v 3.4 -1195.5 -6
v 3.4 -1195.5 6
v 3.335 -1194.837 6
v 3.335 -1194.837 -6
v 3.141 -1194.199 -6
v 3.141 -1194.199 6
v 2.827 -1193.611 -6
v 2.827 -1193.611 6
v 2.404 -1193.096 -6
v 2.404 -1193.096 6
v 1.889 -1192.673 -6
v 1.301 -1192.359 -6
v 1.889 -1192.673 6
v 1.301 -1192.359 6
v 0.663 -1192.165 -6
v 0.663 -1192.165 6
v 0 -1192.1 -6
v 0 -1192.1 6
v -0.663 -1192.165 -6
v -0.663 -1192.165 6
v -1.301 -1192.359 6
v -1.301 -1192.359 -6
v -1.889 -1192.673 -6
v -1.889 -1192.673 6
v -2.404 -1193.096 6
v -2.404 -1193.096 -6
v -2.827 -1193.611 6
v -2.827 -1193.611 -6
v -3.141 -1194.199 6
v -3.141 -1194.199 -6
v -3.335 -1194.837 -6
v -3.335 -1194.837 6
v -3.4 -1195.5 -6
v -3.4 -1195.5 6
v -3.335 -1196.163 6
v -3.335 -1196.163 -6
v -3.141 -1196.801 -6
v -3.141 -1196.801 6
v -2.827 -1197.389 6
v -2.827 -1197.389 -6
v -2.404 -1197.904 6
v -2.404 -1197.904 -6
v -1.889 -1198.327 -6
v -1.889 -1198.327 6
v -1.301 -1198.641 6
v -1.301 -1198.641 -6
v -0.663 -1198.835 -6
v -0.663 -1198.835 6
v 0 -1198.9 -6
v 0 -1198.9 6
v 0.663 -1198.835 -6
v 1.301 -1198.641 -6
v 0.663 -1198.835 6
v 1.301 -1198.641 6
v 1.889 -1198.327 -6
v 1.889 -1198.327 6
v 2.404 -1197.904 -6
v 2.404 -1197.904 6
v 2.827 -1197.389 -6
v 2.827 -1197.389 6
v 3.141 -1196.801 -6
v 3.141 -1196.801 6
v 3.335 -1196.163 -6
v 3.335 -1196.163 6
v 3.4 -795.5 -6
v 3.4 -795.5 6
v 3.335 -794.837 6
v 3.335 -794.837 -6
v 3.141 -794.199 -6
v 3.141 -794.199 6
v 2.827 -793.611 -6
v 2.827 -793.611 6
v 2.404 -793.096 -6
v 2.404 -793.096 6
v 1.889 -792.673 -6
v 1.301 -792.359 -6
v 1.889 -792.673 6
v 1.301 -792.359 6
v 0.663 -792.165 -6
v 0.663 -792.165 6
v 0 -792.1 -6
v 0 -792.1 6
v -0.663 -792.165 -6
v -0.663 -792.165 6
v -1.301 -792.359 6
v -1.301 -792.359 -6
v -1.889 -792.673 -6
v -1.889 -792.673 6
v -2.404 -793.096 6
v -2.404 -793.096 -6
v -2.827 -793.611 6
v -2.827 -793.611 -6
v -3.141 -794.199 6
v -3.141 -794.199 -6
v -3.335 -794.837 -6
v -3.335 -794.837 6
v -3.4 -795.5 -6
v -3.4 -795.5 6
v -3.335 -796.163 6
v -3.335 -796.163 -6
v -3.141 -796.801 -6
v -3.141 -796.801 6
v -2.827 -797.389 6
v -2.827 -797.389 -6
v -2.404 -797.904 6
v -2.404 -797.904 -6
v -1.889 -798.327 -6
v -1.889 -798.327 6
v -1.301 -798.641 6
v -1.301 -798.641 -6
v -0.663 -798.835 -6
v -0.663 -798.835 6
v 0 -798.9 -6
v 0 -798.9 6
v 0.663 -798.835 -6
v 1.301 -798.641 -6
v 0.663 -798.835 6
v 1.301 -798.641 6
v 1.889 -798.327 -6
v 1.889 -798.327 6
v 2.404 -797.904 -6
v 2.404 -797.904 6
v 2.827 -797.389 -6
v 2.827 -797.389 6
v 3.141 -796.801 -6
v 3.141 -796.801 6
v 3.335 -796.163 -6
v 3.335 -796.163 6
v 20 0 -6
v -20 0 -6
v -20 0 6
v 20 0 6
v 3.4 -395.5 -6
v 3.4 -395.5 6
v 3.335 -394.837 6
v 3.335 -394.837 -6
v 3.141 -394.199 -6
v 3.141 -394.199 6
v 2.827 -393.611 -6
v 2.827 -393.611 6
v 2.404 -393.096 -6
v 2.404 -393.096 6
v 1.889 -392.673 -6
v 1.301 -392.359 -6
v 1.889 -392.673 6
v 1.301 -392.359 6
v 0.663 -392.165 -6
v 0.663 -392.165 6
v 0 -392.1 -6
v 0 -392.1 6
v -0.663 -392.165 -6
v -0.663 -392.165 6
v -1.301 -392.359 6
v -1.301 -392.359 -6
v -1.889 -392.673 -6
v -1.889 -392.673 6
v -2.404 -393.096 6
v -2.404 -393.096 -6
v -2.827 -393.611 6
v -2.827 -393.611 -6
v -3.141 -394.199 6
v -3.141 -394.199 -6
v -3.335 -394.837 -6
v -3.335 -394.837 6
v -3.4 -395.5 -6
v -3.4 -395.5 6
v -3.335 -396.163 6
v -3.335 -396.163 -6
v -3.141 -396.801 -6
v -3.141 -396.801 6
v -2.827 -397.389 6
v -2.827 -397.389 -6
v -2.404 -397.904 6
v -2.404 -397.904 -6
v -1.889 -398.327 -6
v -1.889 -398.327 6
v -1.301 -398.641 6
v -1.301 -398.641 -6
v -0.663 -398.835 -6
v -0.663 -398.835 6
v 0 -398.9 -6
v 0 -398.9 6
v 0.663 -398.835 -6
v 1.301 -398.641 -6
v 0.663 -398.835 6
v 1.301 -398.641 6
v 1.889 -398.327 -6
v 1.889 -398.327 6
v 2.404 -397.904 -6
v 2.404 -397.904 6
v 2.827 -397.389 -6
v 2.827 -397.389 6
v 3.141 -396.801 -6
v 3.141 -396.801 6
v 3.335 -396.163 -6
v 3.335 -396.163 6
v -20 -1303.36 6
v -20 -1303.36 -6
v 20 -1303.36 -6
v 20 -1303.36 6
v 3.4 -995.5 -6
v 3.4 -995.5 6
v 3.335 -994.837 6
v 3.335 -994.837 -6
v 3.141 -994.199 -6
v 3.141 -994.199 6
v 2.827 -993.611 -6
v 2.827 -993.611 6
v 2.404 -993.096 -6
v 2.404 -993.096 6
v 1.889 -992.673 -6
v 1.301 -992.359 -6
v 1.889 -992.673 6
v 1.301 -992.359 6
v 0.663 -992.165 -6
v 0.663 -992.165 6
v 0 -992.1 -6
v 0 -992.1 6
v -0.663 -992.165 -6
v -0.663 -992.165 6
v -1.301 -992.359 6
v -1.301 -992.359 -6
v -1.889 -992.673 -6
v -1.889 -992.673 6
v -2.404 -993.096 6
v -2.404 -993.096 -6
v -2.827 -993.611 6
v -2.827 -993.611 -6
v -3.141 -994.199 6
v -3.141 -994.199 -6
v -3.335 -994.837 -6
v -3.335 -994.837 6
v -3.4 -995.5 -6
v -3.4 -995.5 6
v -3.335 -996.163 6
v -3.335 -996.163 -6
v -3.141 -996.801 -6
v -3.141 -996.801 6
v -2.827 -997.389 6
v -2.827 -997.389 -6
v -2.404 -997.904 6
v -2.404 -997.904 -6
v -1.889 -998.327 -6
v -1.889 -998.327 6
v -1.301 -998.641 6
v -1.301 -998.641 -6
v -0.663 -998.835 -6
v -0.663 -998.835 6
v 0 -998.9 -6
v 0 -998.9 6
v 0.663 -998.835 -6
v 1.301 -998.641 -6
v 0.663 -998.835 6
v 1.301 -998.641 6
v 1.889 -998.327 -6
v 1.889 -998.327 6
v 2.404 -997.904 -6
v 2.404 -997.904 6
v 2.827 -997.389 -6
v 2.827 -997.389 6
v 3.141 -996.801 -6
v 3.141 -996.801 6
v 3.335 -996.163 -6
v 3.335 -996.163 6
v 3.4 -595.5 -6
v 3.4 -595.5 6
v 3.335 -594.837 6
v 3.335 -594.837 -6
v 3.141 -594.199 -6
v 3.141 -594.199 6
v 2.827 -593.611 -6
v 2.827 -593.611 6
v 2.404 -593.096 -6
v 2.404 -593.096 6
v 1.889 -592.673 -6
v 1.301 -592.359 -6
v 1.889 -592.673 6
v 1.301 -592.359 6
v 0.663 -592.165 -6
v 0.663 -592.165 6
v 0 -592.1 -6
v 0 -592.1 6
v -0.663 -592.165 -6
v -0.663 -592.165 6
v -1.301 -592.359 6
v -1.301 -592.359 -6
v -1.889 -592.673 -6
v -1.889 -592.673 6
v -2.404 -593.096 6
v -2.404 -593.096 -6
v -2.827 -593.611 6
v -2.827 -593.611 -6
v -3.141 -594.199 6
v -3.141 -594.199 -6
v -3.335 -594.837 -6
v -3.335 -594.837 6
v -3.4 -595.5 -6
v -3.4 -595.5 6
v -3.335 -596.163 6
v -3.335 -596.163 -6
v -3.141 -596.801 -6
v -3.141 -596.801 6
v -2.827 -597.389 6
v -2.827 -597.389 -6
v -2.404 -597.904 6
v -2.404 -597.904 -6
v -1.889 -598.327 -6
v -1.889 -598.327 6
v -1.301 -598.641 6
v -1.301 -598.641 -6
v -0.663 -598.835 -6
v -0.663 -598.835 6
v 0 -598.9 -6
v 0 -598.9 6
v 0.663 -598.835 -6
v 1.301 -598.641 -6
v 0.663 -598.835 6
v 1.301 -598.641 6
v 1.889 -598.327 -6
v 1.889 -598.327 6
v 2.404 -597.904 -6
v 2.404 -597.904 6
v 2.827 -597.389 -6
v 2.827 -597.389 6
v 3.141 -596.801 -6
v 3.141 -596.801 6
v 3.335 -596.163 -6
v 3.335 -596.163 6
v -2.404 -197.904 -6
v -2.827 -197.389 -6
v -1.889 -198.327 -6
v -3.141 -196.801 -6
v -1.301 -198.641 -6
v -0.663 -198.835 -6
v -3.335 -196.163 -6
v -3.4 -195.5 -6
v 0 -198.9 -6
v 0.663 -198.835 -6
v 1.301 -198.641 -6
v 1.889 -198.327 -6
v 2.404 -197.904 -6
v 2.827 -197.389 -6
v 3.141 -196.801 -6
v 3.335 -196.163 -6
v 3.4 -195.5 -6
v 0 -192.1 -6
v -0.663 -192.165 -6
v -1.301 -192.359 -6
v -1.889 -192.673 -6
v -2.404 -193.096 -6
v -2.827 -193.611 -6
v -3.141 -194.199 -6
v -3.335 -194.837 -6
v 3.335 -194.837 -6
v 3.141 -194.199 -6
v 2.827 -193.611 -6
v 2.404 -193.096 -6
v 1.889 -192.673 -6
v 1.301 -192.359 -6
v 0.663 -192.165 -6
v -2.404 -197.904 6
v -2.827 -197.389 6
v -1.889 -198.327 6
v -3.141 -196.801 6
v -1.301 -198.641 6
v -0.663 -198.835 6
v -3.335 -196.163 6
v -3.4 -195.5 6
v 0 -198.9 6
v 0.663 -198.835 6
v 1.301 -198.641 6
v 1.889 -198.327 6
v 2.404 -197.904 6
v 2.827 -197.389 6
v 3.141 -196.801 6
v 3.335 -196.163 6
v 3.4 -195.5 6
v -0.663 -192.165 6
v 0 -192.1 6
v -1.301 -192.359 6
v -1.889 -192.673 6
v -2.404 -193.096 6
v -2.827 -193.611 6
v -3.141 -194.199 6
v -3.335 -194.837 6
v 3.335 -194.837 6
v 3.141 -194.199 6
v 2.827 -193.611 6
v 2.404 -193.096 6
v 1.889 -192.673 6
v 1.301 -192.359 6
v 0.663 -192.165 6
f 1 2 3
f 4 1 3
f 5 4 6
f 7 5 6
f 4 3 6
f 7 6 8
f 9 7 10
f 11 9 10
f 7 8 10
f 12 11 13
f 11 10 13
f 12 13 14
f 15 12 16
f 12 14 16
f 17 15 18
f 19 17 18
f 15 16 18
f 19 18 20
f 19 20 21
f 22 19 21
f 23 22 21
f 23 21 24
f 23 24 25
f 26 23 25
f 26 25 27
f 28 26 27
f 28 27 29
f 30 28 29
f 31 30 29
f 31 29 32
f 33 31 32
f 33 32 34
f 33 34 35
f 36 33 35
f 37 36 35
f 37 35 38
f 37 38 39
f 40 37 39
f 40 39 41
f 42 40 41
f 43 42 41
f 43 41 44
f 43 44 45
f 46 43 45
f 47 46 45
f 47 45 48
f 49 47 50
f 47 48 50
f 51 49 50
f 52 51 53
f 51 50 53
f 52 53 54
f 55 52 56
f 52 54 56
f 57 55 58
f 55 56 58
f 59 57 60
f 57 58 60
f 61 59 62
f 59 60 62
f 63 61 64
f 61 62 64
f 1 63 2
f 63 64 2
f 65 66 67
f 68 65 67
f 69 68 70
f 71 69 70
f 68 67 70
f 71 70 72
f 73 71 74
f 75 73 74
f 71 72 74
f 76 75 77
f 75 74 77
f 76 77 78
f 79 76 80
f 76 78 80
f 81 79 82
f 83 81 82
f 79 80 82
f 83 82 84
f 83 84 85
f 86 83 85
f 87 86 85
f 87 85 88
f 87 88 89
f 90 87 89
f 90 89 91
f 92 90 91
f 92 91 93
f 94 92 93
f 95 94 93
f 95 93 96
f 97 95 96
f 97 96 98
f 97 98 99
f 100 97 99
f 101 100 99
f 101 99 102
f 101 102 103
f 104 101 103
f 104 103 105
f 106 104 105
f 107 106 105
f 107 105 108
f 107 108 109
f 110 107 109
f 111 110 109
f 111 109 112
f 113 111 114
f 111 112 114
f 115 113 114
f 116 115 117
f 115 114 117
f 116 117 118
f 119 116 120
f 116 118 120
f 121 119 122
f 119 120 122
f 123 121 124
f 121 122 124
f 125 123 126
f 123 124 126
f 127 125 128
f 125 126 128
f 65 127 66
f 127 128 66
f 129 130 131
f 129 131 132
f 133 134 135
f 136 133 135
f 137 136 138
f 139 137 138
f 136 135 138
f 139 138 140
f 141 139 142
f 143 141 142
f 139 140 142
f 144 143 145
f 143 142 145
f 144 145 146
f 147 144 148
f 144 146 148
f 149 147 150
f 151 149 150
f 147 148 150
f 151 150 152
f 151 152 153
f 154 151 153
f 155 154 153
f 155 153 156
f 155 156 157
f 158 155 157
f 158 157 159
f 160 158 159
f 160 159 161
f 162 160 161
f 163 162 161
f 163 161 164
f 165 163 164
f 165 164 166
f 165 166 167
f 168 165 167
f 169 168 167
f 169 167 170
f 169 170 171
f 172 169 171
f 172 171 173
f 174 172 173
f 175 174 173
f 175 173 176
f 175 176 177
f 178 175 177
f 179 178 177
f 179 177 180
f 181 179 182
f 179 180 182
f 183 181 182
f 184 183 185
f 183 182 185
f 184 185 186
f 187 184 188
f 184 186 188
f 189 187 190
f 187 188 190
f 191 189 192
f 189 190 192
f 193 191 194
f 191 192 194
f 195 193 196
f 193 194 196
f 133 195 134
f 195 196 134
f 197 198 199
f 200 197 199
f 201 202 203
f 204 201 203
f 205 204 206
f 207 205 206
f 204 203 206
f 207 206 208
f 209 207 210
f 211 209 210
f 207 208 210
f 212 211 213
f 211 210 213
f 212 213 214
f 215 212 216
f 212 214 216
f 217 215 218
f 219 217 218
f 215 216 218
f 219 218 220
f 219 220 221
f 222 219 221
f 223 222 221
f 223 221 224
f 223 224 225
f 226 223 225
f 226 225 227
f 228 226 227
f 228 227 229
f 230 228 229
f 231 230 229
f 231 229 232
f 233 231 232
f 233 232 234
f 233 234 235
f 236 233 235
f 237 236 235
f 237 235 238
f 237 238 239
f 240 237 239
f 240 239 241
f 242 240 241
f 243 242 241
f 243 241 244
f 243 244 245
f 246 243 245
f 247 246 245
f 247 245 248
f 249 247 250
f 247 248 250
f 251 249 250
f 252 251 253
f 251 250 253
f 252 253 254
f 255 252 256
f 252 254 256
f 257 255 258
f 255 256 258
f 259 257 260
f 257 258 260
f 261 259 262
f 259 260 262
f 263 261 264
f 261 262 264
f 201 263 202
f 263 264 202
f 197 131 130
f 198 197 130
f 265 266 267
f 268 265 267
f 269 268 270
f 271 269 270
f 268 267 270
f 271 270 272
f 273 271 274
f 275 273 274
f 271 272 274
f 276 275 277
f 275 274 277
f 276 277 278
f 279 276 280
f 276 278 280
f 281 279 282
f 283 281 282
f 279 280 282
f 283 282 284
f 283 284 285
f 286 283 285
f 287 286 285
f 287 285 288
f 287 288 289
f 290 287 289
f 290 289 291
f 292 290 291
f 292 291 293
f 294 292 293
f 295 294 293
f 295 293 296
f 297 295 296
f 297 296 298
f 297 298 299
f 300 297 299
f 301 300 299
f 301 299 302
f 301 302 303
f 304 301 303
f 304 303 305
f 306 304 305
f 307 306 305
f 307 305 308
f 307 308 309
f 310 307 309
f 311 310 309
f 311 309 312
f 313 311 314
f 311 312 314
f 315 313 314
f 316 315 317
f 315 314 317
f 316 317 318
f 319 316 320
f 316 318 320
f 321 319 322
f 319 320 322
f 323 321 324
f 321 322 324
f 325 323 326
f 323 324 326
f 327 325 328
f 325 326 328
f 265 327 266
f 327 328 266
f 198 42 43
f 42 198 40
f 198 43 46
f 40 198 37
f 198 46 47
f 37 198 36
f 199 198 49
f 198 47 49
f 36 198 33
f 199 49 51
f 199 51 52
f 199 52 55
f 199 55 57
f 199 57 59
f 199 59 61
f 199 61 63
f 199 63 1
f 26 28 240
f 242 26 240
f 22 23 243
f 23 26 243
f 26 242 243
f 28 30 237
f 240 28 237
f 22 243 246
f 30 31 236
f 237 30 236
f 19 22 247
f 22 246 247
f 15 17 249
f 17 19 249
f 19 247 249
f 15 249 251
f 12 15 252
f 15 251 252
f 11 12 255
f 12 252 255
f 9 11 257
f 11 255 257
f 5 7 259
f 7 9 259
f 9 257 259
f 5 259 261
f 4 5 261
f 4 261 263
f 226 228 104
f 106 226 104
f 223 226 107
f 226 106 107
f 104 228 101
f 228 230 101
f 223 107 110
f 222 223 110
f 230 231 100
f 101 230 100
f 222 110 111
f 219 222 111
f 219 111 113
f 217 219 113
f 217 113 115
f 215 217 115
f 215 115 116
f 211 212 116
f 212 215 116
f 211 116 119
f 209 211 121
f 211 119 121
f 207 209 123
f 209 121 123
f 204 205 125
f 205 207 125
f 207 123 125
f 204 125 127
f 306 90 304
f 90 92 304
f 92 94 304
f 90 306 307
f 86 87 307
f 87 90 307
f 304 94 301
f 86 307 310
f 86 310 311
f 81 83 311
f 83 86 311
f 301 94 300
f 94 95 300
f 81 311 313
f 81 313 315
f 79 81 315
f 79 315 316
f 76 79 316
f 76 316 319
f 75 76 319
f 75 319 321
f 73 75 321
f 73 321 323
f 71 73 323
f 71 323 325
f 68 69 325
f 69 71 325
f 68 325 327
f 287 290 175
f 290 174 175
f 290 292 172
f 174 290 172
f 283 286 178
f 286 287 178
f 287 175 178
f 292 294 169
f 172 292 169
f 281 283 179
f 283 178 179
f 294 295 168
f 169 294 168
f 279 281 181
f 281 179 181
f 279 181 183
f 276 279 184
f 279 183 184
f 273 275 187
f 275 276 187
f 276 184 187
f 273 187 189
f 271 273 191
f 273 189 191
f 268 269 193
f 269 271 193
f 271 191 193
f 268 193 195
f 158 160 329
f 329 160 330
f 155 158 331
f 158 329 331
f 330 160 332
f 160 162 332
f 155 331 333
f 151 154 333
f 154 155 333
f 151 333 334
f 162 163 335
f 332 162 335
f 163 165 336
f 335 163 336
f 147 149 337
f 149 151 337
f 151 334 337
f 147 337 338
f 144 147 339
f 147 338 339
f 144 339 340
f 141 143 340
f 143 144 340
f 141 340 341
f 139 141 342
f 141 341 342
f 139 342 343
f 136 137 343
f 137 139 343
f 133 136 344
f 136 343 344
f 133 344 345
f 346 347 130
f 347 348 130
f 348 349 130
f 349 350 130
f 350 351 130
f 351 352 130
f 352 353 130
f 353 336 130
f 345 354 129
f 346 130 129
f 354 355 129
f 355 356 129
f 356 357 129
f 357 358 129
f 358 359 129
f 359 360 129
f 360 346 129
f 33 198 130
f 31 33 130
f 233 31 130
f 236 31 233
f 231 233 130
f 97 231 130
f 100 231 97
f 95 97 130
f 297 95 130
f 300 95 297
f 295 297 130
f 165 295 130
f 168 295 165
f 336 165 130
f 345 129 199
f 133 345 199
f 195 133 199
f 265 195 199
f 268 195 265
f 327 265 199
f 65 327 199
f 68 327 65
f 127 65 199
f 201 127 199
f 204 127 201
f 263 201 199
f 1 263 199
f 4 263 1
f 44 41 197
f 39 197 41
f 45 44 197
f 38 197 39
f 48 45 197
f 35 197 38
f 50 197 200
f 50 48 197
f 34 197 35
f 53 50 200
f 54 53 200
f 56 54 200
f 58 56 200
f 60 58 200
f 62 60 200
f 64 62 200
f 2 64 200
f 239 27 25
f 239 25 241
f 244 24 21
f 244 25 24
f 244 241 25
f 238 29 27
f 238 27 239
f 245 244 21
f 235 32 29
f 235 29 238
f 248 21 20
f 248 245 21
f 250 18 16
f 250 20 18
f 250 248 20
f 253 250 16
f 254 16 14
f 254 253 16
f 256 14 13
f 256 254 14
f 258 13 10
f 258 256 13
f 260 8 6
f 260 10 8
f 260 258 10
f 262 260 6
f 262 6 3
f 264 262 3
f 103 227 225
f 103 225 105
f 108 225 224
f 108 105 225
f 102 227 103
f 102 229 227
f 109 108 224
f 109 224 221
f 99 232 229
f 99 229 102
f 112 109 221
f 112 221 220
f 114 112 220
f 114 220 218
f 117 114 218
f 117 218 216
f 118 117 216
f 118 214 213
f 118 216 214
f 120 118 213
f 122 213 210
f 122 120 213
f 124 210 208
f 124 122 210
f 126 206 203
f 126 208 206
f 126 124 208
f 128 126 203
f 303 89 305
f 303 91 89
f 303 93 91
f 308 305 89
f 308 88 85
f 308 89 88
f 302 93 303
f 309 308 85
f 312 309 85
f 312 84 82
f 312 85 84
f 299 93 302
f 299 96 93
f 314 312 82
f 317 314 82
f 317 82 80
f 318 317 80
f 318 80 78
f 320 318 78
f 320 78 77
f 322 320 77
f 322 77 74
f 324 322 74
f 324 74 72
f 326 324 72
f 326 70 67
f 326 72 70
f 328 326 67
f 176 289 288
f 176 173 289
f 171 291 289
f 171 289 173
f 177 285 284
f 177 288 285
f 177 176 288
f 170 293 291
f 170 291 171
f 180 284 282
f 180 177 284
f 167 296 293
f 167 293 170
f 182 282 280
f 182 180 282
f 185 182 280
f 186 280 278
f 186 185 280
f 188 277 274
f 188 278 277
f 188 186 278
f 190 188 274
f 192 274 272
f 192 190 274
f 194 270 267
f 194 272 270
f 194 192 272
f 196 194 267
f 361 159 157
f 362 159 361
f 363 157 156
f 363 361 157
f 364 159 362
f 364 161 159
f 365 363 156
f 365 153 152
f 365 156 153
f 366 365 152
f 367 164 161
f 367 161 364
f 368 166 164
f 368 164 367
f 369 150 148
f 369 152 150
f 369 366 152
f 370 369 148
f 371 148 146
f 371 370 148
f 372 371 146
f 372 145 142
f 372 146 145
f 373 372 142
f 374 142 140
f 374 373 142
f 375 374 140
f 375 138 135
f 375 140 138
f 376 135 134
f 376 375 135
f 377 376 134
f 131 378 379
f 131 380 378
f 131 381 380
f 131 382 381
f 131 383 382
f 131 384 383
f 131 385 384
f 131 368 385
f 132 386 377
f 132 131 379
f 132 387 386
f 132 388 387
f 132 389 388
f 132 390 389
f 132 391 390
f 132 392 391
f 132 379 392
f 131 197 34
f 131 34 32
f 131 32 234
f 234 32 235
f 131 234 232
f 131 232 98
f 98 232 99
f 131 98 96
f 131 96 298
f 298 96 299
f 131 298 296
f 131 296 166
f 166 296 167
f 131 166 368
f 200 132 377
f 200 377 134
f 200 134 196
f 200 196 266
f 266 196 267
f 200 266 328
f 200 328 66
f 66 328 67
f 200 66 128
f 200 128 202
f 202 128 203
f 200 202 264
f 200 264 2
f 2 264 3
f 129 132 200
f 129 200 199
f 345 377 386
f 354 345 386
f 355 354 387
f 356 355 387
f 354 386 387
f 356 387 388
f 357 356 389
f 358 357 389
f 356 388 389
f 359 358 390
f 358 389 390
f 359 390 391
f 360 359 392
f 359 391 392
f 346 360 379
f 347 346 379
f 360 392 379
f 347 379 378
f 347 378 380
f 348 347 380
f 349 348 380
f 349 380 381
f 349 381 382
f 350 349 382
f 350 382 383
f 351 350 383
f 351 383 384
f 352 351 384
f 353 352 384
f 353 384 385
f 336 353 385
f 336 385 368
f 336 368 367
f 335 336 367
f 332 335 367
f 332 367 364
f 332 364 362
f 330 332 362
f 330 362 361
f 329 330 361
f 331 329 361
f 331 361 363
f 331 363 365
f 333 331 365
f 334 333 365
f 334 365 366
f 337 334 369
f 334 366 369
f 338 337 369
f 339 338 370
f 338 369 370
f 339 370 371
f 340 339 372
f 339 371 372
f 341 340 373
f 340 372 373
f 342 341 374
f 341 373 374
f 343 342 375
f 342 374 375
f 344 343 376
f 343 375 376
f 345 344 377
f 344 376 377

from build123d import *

# Parameters (mm, degrees)
SKETCH1_W           = 40
SKETCH1_H           = 12
BOSS_EXTRUDE1_DEPTH = 1303.36
SKETCH2_R           = 3.4
CUT_EXTRUDE1_DEPTH  = 13


with BuildPart() as part:
    # Sketch1 → Boss-Extrude1 (new body)
    with BuildSketch(Plane(origin=(0, 0, 0), x_dir=(1, 0, 0), z_dir=(0, 1, 0))):
        Rectangle(SKETCH1_W, SKETCH1_H)
    extrude(amount=-BOSS_EXTRUDE1_DEPTH)

    # Sketch2 → Cut-Extrude1 (cut, through all)
    with BuildSketch(Plane.XY.offset(6)):
        with Locations((0, -995.5)):
            Circle(SKETCH2_R)
        with Locations((0, -795.5)):
            Circle(SKETCH2_R)
        with Locations((0, -395.5)):
            Circle(SKETCH2_R)
        with Locations((0, -195.5)):
            Circle(SKETCH2_R)
        with Locations((0, 4.5)):
            Circle(SKETCH2_R)
        with Locations((0, -595.5)):
            Circle(SKETCH2_R)
        with Locations((0, -1195.5)):
            Circle(SKETCH2_R)
    extrude(amount=-CUT_EXTRUDE1_DEPTH, mode=Mode.SUBTRACT)


solid = part.part
